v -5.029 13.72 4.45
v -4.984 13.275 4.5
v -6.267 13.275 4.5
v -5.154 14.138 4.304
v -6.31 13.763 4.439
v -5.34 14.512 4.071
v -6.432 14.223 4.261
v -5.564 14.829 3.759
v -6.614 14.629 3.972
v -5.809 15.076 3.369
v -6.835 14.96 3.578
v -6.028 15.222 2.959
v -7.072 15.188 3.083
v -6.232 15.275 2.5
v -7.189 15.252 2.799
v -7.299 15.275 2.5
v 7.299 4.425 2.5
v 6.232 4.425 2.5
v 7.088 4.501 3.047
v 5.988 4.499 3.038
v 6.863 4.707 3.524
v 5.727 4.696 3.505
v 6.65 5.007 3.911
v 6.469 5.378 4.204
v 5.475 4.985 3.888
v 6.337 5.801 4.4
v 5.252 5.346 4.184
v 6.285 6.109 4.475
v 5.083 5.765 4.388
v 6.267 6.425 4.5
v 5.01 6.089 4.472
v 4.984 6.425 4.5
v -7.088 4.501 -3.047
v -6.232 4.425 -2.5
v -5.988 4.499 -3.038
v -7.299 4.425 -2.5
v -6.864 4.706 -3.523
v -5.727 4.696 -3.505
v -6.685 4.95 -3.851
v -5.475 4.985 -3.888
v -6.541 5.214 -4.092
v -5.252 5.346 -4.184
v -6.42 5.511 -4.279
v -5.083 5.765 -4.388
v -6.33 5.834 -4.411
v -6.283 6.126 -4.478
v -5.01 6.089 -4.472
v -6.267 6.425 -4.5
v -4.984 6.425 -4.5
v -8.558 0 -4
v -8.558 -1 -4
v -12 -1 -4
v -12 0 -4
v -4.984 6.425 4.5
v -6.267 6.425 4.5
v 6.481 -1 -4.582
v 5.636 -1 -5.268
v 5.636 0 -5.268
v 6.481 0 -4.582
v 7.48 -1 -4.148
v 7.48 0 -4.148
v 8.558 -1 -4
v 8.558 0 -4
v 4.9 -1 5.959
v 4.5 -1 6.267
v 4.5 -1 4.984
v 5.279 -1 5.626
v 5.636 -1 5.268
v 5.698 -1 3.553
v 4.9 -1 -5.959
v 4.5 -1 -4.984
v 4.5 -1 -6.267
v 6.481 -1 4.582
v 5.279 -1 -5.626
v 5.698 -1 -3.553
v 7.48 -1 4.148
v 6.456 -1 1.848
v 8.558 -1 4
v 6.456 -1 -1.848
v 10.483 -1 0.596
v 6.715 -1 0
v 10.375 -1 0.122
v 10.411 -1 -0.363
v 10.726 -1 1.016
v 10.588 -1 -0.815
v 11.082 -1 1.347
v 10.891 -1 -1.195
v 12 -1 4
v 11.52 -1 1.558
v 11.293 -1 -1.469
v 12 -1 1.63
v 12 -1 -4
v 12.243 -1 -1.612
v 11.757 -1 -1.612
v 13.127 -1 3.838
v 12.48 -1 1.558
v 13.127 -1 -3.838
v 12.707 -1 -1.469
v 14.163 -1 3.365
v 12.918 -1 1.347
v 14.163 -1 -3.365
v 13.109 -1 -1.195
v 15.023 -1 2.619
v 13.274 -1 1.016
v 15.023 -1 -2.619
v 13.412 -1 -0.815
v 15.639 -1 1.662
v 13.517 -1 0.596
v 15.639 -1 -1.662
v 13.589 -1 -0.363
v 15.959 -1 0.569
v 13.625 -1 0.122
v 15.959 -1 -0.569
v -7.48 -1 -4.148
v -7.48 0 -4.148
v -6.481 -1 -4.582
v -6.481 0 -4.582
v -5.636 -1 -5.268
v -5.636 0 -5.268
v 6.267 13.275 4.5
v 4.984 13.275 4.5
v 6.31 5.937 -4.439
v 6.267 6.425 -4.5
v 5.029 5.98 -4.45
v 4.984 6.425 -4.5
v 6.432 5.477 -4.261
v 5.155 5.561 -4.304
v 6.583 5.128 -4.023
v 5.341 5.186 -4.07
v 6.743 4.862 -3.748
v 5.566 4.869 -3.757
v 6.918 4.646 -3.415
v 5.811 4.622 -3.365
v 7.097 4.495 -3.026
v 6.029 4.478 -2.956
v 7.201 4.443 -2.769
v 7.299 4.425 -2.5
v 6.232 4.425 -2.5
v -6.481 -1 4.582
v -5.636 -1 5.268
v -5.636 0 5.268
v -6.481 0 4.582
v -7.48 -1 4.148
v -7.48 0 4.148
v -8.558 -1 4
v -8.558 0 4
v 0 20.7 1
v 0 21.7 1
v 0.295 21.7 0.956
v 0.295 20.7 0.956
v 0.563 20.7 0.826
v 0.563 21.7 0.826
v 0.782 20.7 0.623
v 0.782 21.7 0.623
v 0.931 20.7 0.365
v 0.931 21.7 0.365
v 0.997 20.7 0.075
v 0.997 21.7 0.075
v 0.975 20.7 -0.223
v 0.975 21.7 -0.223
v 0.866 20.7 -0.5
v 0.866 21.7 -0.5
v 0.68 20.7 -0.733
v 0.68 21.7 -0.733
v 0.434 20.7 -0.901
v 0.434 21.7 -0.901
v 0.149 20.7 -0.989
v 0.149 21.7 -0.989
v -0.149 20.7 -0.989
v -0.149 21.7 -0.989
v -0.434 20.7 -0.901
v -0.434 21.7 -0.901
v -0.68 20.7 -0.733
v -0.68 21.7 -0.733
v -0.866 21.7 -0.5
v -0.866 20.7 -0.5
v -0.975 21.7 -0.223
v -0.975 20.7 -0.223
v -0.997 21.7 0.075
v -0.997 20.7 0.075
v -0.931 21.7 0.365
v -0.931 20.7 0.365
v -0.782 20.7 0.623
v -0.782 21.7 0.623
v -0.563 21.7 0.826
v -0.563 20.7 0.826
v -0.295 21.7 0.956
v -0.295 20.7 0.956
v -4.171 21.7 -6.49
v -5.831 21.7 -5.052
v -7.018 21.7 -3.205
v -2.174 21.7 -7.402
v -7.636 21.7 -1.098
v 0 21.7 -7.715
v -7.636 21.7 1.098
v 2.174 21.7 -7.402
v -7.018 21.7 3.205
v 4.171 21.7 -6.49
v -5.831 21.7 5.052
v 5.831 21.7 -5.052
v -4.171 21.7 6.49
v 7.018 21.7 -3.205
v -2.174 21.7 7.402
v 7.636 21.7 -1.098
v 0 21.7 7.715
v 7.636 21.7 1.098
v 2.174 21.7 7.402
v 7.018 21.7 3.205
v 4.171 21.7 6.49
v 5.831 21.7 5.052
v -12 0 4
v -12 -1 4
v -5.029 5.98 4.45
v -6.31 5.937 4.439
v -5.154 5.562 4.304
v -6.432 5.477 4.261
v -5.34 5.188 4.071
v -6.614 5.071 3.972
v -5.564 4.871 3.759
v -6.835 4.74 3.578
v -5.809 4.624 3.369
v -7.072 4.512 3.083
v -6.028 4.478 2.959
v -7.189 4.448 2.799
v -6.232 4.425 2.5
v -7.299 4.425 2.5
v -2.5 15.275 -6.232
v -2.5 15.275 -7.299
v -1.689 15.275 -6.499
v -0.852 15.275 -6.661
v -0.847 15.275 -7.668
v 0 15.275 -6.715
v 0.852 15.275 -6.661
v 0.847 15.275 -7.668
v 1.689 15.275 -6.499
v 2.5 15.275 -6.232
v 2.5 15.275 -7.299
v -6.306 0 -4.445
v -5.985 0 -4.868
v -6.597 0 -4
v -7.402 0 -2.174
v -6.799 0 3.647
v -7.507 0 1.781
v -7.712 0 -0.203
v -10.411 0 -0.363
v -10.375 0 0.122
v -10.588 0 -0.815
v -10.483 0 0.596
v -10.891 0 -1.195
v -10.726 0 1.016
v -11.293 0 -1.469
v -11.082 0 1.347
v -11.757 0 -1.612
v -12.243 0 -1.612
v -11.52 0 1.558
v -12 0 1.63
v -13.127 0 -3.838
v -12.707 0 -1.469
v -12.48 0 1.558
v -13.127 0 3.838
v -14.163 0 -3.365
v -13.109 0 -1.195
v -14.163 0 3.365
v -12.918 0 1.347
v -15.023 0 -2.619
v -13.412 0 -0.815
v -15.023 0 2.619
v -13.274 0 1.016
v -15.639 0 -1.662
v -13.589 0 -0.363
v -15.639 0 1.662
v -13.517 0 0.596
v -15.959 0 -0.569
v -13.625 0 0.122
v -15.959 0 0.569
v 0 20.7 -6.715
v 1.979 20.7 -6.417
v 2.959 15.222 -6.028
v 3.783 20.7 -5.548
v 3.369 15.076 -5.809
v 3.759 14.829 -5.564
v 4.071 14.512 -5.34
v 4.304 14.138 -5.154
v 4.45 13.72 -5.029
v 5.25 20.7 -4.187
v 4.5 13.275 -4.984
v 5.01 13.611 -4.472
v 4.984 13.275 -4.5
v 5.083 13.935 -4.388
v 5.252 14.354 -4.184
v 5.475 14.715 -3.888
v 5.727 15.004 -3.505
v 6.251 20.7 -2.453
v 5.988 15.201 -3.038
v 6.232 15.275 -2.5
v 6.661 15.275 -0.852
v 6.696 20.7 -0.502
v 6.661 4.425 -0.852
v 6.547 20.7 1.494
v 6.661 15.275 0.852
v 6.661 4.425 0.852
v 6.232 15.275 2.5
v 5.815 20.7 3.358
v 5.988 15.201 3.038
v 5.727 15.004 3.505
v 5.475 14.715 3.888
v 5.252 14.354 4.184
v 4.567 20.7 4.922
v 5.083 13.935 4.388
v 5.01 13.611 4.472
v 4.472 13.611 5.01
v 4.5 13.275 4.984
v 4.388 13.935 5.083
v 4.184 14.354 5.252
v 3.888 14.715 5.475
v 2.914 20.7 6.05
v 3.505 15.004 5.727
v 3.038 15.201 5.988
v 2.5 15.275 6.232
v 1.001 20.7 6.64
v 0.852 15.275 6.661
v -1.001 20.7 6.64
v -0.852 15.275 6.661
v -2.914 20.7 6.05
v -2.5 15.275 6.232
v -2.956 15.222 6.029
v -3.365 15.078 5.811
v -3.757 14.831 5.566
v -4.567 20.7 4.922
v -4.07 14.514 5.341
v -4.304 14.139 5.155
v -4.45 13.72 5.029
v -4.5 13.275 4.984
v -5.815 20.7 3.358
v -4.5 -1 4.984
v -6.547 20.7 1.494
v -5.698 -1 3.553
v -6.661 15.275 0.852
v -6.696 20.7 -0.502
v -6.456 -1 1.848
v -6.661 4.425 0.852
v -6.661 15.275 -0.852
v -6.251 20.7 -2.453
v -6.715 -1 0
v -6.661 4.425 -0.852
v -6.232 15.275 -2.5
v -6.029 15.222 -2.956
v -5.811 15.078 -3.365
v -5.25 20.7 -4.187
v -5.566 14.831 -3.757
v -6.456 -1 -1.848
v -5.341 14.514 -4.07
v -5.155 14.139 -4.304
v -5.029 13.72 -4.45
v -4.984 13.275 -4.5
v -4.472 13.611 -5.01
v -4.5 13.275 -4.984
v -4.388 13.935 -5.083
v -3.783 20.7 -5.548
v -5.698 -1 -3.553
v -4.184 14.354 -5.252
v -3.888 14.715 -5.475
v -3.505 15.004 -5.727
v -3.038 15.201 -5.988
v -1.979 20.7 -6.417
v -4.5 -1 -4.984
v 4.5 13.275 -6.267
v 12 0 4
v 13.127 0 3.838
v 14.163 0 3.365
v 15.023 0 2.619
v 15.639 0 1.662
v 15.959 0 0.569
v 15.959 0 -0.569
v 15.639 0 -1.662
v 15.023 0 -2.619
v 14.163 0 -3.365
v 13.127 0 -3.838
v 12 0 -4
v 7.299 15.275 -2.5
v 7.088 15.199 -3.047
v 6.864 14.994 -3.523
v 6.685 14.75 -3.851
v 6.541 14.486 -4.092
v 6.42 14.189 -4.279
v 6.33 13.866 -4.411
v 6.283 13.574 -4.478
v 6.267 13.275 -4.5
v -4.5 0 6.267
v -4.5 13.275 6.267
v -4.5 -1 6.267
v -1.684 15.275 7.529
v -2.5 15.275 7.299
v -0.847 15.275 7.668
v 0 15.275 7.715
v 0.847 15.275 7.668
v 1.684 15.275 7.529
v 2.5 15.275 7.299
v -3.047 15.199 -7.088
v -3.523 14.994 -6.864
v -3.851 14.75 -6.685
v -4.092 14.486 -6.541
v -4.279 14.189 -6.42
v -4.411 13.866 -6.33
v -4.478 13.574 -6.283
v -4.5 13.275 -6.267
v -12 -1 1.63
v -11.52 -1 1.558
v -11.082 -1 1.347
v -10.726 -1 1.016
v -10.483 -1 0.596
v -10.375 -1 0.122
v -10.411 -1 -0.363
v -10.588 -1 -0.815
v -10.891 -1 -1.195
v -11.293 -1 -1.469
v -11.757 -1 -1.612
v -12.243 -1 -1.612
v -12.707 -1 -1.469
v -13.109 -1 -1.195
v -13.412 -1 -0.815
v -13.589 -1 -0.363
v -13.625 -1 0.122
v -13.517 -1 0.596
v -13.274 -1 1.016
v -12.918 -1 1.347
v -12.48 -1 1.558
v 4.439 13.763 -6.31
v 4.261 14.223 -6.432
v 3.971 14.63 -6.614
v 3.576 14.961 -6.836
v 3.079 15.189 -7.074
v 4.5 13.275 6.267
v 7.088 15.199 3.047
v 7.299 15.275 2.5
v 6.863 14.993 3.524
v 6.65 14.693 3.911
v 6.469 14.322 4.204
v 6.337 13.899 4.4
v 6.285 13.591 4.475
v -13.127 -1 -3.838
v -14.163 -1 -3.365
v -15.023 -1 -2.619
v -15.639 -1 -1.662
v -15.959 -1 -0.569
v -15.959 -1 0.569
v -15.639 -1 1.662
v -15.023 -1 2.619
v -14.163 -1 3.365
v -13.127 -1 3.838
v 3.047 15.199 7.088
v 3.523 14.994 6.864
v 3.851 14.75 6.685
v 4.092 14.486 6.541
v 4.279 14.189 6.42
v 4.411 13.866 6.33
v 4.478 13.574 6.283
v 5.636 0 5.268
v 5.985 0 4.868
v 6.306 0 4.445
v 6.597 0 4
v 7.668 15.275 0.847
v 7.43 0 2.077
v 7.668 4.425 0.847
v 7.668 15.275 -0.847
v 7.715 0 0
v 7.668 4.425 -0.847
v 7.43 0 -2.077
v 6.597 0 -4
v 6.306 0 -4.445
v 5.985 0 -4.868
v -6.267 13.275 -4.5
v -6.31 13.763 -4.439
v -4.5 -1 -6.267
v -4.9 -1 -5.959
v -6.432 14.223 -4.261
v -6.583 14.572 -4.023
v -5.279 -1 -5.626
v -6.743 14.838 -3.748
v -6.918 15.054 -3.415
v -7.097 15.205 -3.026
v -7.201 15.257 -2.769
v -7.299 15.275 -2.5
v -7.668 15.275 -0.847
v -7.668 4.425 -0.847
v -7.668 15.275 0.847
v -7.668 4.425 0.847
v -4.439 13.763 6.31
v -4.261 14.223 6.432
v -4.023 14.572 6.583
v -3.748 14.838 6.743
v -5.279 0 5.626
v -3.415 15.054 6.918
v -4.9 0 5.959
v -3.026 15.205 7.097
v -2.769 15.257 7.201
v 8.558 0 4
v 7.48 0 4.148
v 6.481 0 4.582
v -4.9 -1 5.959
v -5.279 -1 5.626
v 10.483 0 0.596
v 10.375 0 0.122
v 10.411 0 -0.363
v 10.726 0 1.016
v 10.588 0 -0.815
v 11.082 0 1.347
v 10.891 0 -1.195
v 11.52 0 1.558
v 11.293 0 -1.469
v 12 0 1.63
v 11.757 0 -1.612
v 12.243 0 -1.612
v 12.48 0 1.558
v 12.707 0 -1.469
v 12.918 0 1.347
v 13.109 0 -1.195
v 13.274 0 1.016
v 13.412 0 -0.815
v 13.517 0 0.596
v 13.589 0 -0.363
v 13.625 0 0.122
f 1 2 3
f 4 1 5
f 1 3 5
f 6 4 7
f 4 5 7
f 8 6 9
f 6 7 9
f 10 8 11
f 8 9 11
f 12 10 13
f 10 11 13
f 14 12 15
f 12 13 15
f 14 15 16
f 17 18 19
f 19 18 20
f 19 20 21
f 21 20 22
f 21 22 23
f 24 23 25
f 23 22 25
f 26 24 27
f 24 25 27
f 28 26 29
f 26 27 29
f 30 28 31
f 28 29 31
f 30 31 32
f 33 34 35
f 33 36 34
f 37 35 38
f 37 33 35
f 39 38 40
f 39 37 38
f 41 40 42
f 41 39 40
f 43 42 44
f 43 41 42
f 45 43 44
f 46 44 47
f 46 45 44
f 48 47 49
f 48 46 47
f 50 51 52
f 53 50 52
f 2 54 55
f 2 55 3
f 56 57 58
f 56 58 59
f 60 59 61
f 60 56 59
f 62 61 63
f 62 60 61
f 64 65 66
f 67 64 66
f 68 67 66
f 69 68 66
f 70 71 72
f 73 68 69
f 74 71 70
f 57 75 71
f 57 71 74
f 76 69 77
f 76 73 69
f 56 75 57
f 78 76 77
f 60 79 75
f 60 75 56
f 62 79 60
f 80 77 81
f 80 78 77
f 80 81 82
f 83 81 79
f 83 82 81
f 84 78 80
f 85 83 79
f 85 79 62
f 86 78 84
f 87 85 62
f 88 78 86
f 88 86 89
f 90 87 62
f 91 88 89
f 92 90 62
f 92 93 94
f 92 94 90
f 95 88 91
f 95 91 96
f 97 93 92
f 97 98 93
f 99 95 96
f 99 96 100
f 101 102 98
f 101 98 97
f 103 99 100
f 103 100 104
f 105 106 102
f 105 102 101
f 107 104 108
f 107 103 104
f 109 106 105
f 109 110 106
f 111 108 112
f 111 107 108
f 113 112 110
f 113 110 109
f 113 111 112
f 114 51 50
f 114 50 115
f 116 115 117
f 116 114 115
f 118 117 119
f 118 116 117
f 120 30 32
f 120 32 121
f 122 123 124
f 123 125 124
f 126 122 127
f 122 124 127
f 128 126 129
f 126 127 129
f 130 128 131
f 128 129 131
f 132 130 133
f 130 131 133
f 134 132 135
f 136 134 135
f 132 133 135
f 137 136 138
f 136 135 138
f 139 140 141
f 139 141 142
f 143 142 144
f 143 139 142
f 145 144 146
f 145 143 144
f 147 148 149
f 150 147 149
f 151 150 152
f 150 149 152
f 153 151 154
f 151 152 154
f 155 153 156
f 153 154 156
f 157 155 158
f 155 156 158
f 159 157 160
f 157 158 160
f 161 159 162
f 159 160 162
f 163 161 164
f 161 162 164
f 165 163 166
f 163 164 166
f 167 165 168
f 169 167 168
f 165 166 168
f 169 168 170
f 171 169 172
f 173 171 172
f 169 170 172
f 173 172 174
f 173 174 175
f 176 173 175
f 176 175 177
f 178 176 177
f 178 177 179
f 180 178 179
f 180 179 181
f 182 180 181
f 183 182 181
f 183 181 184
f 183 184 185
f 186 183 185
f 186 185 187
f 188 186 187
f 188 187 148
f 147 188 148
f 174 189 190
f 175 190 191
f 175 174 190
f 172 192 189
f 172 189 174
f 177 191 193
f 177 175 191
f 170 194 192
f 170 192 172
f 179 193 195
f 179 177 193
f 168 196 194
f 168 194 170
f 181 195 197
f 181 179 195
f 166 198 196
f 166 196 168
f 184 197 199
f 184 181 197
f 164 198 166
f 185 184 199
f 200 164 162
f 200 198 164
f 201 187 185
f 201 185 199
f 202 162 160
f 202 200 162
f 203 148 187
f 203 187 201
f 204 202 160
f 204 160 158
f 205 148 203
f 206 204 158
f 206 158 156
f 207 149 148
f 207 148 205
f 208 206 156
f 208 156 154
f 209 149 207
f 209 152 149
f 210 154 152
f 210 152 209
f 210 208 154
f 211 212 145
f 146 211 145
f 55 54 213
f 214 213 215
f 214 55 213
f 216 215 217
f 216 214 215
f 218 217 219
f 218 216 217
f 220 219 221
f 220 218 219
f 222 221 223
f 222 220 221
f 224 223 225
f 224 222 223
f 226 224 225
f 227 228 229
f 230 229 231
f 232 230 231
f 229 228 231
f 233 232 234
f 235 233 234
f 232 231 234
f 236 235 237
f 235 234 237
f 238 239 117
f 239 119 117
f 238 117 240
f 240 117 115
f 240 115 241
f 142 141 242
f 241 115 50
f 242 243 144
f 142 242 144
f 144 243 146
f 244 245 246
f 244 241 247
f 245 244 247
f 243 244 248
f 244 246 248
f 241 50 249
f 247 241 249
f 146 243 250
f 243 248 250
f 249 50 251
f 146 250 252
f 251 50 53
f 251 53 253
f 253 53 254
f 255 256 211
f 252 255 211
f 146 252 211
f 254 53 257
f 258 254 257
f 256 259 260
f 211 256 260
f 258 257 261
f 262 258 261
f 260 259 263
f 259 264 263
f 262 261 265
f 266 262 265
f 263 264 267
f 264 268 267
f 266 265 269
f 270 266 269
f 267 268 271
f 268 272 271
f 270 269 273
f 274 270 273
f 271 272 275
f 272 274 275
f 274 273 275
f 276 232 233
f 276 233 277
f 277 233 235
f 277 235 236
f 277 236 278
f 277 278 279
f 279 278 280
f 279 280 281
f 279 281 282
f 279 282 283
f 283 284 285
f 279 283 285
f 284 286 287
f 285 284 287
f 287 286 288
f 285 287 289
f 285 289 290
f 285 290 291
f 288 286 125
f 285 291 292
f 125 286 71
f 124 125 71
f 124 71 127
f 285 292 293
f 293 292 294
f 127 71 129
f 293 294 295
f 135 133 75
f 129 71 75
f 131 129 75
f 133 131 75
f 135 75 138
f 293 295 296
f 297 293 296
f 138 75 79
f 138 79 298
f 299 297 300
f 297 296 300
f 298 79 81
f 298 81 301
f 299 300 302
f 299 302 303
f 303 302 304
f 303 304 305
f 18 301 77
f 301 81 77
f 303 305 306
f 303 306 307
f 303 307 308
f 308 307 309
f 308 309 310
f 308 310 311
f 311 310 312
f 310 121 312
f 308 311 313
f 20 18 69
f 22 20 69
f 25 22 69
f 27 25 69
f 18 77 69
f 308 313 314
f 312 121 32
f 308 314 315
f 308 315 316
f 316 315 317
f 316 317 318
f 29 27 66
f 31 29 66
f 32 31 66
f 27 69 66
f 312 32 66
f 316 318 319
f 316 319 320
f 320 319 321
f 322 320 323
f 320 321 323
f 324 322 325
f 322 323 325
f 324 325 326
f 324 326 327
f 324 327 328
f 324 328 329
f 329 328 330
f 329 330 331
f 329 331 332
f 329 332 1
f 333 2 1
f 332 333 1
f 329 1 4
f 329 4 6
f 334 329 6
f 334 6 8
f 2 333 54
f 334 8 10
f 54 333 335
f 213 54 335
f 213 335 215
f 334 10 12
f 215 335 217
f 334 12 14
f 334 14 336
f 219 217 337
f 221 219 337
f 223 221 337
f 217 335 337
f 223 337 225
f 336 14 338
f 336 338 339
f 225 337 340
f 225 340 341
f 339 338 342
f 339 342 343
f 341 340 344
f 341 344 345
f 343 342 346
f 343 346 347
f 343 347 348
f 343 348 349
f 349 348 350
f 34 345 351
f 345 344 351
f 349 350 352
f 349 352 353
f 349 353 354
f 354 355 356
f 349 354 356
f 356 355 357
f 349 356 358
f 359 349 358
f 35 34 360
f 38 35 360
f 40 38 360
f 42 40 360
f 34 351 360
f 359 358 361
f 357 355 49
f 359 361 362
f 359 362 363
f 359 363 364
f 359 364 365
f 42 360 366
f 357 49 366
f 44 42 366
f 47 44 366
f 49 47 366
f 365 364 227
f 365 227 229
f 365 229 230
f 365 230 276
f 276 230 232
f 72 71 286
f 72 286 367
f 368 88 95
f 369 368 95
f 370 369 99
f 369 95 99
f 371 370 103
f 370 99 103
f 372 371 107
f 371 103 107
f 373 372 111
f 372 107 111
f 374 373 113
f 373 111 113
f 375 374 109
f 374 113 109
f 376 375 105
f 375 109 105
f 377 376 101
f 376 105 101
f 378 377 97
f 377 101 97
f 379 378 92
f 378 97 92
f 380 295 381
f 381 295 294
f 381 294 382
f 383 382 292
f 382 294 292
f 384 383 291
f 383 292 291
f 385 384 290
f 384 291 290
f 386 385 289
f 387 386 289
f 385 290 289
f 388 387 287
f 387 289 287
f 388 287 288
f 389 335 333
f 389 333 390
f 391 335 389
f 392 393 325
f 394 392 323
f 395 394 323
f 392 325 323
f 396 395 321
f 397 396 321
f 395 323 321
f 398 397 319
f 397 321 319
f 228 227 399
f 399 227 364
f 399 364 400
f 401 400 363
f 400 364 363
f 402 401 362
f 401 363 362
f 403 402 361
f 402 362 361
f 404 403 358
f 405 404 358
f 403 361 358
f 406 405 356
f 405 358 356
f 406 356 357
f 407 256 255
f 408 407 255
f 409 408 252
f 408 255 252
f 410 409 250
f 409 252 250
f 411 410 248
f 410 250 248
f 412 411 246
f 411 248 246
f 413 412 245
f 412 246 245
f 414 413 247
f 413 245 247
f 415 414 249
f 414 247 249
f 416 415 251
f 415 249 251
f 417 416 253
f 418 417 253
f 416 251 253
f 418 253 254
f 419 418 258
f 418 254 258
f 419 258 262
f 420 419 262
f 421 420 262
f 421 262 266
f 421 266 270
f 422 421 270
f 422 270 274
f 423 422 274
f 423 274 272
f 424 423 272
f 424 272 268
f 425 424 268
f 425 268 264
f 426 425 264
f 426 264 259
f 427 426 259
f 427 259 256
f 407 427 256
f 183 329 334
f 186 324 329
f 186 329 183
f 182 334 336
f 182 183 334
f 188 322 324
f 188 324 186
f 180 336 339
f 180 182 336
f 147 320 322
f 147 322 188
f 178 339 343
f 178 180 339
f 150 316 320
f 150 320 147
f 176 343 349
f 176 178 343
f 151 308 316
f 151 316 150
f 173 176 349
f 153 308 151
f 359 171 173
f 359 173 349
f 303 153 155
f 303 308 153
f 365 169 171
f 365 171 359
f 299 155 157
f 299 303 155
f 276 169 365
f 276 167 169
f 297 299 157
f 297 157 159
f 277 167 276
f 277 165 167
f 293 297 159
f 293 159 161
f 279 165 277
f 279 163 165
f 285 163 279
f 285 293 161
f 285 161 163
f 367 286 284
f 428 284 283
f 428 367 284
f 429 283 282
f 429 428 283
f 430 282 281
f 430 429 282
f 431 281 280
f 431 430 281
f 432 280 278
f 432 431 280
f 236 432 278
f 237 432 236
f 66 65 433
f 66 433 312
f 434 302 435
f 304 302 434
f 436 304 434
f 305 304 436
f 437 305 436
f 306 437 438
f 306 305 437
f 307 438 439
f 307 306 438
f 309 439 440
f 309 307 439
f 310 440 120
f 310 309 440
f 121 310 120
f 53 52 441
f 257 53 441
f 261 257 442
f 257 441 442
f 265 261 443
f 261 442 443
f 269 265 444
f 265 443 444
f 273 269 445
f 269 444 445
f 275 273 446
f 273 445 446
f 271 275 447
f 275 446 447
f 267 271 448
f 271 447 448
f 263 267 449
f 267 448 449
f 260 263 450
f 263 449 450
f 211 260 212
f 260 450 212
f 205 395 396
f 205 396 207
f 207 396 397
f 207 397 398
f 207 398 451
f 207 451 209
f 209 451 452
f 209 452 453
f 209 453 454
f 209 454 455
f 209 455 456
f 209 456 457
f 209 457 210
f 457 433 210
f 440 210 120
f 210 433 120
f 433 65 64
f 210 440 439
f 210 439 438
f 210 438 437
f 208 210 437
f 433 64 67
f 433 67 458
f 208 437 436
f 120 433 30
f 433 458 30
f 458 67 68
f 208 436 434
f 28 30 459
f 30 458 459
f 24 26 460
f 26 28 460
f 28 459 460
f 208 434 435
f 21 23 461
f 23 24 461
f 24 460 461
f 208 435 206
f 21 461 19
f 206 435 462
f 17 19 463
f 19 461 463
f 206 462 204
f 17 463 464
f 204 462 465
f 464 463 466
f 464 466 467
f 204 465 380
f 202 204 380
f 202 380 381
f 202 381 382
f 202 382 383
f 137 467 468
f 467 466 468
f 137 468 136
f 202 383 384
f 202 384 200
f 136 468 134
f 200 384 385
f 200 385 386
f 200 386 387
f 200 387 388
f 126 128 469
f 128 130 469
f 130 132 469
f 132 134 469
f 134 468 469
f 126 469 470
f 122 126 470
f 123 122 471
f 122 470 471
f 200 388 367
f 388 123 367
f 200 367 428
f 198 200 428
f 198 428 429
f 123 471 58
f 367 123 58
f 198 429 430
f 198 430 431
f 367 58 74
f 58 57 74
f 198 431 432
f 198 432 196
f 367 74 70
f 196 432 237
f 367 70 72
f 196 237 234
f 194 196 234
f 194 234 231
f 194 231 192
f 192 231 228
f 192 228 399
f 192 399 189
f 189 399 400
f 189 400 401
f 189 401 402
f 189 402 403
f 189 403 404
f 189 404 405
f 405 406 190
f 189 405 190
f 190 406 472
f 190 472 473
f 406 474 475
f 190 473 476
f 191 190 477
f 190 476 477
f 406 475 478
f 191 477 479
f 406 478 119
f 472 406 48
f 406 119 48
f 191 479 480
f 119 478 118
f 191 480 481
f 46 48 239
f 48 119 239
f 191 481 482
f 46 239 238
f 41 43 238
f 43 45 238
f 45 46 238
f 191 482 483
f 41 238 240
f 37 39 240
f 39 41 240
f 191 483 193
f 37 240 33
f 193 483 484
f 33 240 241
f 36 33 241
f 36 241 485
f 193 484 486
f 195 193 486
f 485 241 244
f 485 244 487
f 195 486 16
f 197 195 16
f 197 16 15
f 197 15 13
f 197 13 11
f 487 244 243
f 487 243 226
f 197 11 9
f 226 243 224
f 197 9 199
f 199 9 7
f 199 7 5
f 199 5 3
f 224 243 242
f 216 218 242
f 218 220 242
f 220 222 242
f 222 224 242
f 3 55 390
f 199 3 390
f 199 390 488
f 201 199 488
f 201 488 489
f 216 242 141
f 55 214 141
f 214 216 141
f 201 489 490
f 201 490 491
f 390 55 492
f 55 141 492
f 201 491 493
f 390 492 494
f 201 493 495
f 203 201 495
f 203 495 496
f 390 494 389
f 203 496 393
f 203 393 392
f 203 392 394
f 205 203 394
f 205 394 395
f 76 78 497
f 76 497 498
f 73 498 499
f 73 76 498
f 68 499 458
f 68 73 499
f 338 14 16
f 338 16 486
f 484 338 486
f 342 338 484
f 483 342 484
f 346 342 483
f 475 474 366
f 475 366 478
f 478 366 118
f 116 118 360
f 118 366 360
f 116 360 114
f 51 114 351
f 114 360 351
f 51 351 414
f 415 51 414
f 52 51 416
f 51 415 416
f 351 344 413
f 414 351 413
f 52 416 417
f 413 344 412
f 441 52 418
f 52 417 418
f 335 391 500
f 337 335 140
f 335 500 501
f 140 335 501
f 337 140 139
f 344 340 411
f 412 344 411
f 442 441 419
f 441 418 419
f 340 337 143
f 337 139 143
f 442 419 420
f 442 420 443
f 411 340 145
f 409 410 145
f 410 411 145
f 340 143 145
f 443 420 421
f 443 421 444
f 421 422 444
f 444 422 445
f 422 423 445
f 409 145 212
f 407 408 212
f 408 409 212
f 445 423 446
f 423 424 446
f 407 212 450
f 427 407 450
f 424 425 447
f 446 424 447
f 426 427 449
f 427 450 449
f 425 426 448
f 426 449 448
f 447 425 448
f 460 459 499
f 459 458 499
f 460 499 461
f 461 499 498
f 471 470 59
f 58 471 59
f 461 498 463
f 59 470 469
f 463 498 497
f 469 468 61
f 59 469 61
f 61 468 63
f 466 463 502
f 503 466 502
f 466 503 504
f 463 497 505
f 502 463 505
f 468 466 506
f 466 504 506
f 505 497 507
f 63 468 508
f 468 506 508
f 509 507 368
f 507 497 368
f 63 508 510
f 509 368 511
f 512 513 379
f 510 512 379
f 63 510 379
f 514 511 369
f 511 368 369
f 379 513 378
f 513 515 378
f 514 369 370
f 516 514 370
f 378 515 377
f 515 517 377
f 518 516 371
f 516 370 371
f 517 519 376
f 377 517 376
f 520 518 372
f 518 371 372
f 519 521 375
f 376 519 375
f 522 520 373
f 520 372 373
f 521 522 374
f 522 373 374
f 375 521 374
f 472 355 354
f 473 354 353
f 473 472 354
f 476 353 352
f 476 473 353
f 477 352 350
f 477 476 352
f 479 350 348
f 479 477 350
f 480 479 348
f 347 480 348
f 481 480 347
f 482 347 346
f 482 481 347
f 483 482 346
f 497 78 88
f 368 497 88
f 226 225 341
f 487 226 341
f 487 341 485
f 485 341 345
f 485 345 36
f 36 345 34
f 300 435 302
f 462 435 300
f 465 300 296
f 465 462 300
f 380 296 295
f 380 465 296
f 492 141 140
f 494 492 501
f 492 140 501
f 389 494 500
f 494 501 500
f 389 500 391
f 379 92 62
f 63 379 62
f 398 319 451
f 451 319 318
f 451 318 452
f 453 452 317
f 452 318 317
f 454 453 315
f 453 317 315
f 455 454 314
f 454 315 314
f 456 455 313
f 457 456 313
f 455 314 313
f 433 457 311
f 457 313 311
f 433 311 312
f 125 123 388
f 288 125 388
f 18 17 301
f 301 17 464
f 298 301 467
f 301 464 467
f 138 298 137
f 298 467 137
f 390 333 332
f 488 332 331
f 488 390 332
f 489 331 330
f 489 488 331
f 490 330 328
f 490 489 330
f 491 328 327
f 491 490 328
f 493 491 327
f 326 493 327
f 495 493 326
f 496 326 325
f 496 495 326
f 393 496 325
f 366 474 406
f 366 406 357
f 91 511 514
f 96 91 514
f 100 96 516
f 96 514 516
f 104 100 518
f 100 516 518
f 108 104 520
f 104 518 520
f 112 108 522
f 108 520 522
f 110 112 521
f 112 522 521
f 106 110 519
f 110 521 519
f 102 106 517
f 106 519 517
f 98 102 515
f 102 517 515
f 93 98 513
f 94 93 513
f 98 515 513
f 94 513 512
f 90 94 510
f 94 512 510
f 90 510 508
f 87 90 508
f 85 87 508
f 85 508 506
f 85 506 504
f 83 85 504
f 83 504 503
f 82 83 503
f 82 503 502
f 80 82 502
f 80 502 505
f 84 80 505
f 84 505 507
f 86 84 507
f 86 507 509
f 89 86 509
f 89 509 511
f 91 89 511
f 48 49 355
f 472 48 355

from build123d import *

# Parameters (mm, degrees)
SKETCH2_R           = 7.715
BOSS_EXTRUDE1_DEPTH = 21.7
SKETCH4_R           = 1
CUT_EXTRUDE2_DEPTH  = 25.288525068
BOSS_EXTRUDE2_START = 1
SKETCH11_R          = 6.715
BOSS_EXTRUDE2_DEPTH = 1
SKETCH12_R          = 6.715
CUT_EXTRUDE7_DEPTH  = 20.7
CUT_EXTRUDE8_START  = -1
CUT_EXTRUDE8_DEPTH  = 16.275
SKETCH14_W          = 9
SKETCH14_H          = 10.85
CUT_EXTRUDE9_DEPTH  = 52.443281631
FILLET3_R           = 2
FILLET4_R           = 4
CUT_EXTRUDE10_REACH = 30.043
SKETCH15_R          = 1.63


# Read off the part's stored shape, not the designer's step: Cut-Extrude8
with BuildPart() as part:
    # Sketch2 → Boss-Extrude1 (new body)
    with BuildSketch(Plane(origin=(0, 0, 0), x_dir=(1, 0, 0), z_dir=(0, 1, 0))):
        with Locations(Location((0, 0, 0), (0, 0, 270))):
            Circle(SKETCH2_R)
    extrude(amount=BOSS_EXTRUDE1_DEPTH)

    # Sketch4 → Cut-Extrude2 (cut, through all)
    with BuildSketch(Plane(origin=(0, 21.7, 0), x_dir=(1, 0, 0), z_dir=(0, 1, 0))):
        with Locations(Location((0, 0, 0), (0, 0, 270))):
            Circle(SKETCH4_R)
    extrude(amount=-CUT_EXTRUDE2_DEPTH, mode=Mode.SUBTRACT)

    # Sketch11 → Boss-Extrude2 (add)
    with BuildSketch(Plane.XZ.offset(BOSS_EXTRUDE2_START)):
        with BuildLine():
            Line((6.597061846, 4), (16, 4))
            Line((16, 4), (16, -4))
            Line((16, -4), (6.597061846, -4))
            ThreePointArc((6.597061846, -4), (0, -7.715), (-6.597061846, -4))
            Line((-6.597061846, -4), (-16, -4))
            Line((-16, -4), (-16, 4))
            Line((-16, 4), (-6.597061846, 4))
            ThreePointArc((-6.597061846, 4), (0, 7.715), (6.597061846, 4))
        make_face()
        with Locations(Location((0, 0, 0), (0, 0, 270))):
            Circle(SKETCH11_R, mode=Mode.SUBTRACT)
    extrude(amount=-BOSS_EXTRUDE2_DEPTH)

    # Sketch12 → Cut-Extrude7 (cut)
    with BuildSketch(Plane.XZ):
        with Locations(Location((0, 0, 0), (0, 0, 270))):
            Circle(SKETCH12_R)
    extrude(amount=-CUT_EXTRUDE7_DEPTH, mode=Mode.SUBTRACT)

    # Cut-Extrude8 outline → Cut-Extrude8 (cut)
    with BuildSketch(Plane(origin=(0, 0, 0), x_dir=(1, 0, 0), z_dir=(0, 1, 0)).offset(CUT_EXTRUDE8_START)):
        with BuildLine():
            ThreePointArc((4.5, -4.98409721), (0, -6.715), (-4.5, -4.98409721))
            Line((-4.5, -4.98409721), (-4.5, -6.266675754))
            ThreePointArc((-4.5, -6.266675754), (0, -7.715), (4.5, -6.266675754))
            Line((4.5, -6.266675754), (4.5, -4.98409721))
        make_face()
        with BuildLine():
            Line((-4.5, 6.266675754), (-4.5, 4.98409721))
            ThreePointArc((-4.5, 4.98409721), (0, 6.715), (4.5, 4.98409721))
            Line((4.5, 4.98409721), (4.5, 6.266675754))
            ThreePointArc((4.5, 6.266675754), (0, 7.715), (-4.5, 6.266675754))
        make_face()
    extrude(amount=CUT_EXTRUDE8_DEPTH, mode=Mode.SUBTRACT)

    # Sketch14 → Cut-Extrude9 (cut, through all)
    with BuildSketch(Plane(origin=(30, 0, 0), x_dir=(0, 0, -1), z_dir=(1, 0, 0))):
        with Locations((0, 9.85)):
            Rectangle(SKETCH14_W, SKETCH14_H)
    extrude(amount=-CUT_EXTRUDE9_DEPTH, mode=Mode.SUBTRACT)

    # Fillet3
    fillet3_edges = [part.edges().sort_by_distance(p)[0] for p in [
        (4.5, 15.275, 5.625386482),
        (4.5, 15.275, -5.625386482),
        (-4.5, 15.275, -5.625386482),
        (-4.5, 15.275, 5.625386482),
        (5.625386482, 15.275, -4.5),
        (-5.625386482, 15.275, -4.5),
        (5.625386482, 4.425, -4.5),
        (-5.625386482, 4.425, -4.5),
        (-5.625386482, 4.425, 4.5),
        (5.625386482, 4.425, 4.5),
        (5.625386482, 15.275, 4.5),
        (-5.625386482, 15.275, 4.5),
    ]]
    fillet(fillet3_edges, radius=FILLET3_R)

    # Fillet4
    # the kernel refuses this fillet: 4 mm, written as the material it adds along each edge
    with BuildSketch(Plane(origin=(6.597061846, -1, -4), x_dir=(-0.6038984095873641, 0, -0.797061296825942), z_dir=(0, 1, 0)), Plane(origin=(-6.597061846, -1, 4), x_dir=(0.6038984095873637, 0, 0.7970612968259423), z_dir=(0, 1, 0))) as fillet4_piece_1:
        with BuildLine():
            CenterArc((2.003972094, -3.978668209), FILLET4_R, 95.919901586, 46.930484551)
            Line((-1.184273093, -1.563074571), (0, 0))
            ThreePointArc((0, 0), (0.795709969, -0.041143691), (1.591419939, 0))
        make_face()
    extrude(amount=1)
    with BuildSketch(Plane(origin=(6.597061846, -1, 4), x_dir=(-0.6038984095873636, 0, 0.7970612968259423), z_dir=(0, 1, 0)), Plane(origin=(-6.597061846, -1, -4), x_dir=(0.6038984095873643, 0, -0.7970612968259416), z_dir=(0, 1, 0))) as fillet4_piece_2:
        with BuildLine():
            CenterArc((2.003972094, 3.978668209), FILLET4_R, 217.149613863, 46.930484551)
            Line((-1.184273093, 1.563074571), (0, 0))
            ThreePointArc((0, 0), (0.795709969, 0.041143691), (1.591419939, 0))
        make_face()
    extrude(amount=1)
    # the kernel refuses this fillet: 4 mm, written as the material it takes off along each edge
    with BuildSketch(Plane(origin=(16, -11, -4), x_dir=(0, 0, 1), z_dir=(0, 1, 0)), Plane(origin=(16, -11, 4), x_dir=(-1, 0, 0), z_dir=(0, 1, 0))) as fillet4_2_piece_1:
        with BuildLine():
            CenterArc((FILLET4_R, -FILLET4_R), FILLET4_R, 90, 90)
            Line((0, -FILLET4_R), (0, 0))
            Line((0, 0), (FILLET4_R, 0))
        make_face()
    extrude(amount=21, mode=Mode.SUBTRACT)
    with BuildSketch(Plane(origin=(-16, -11, -4), x_dir=(0, 0, 1), z_dir=(0, 1, 0)), Plane(origin=(-16, -11, 4), x_dir=(1, 0, 0), z_dir=(0, 1, 0))) as fillet4_2_piece_2:
        with BuildLine():
            CenterArc((FILLET4_R, FILLET4_R), FILLET4_R, 180, 90)
            Line((0, FILLET4_R), (0, 0))
            Line((0, 0), (FILLET4_R, 0))
        make_face()
    extrude(amount=21, mode=Mode.SUBTRACT)

    # Sketch15 → Cut-Extrude10 (cut, up to next)
    with BuildSketch(Plane(origin=(0, 0, 0), x_dir=(1, 0, 0), z_dir=(0, 1, 0)), mode=Mode.PRIVATE) as cut_extrude10_sk1:
        with Locations(Location((-12, 0, 0), (0, 0, 270))):
            Circle(SKETCH15_R)
    cut_extrude10_tool1 = extrude(cut_extrude10_sk1.sketch, amount=-CUT_EXTRUDE10_REACH, mode=Mode.PRIVATE) & part.part
    # Sketch15 → Cut-Extrude10 (cut, up to next)
    with BuildSketch(Plane(origin=(0, 0, 0), x_dir=(1, 0, 0), z_dir=(0, 1, 0)), mode=Mode.PRIVATE) as cut_extrude10_sk2:
        with Locations(Location((12, 0, 0), (0, 0, 270))):
            Circle(SKETCH15_R)
    cut_extrude10_tool2 = extrude(cut_extrude10_sk2.sketch, amount=-CUT_EXTRUDE10_REACH, mode=Mode.PRIVATE) & part.part
    add(cut_extrude10_tool1.solids().sort_by_distance((-12, 0, 0))[0], mode=Mode.SUBTRACT)
    add(cut_extrude10_tool2.solids().sort_by_distance((12, 0, 0))[0], mode=Mode.SUBTRACT)


solid = part.part
